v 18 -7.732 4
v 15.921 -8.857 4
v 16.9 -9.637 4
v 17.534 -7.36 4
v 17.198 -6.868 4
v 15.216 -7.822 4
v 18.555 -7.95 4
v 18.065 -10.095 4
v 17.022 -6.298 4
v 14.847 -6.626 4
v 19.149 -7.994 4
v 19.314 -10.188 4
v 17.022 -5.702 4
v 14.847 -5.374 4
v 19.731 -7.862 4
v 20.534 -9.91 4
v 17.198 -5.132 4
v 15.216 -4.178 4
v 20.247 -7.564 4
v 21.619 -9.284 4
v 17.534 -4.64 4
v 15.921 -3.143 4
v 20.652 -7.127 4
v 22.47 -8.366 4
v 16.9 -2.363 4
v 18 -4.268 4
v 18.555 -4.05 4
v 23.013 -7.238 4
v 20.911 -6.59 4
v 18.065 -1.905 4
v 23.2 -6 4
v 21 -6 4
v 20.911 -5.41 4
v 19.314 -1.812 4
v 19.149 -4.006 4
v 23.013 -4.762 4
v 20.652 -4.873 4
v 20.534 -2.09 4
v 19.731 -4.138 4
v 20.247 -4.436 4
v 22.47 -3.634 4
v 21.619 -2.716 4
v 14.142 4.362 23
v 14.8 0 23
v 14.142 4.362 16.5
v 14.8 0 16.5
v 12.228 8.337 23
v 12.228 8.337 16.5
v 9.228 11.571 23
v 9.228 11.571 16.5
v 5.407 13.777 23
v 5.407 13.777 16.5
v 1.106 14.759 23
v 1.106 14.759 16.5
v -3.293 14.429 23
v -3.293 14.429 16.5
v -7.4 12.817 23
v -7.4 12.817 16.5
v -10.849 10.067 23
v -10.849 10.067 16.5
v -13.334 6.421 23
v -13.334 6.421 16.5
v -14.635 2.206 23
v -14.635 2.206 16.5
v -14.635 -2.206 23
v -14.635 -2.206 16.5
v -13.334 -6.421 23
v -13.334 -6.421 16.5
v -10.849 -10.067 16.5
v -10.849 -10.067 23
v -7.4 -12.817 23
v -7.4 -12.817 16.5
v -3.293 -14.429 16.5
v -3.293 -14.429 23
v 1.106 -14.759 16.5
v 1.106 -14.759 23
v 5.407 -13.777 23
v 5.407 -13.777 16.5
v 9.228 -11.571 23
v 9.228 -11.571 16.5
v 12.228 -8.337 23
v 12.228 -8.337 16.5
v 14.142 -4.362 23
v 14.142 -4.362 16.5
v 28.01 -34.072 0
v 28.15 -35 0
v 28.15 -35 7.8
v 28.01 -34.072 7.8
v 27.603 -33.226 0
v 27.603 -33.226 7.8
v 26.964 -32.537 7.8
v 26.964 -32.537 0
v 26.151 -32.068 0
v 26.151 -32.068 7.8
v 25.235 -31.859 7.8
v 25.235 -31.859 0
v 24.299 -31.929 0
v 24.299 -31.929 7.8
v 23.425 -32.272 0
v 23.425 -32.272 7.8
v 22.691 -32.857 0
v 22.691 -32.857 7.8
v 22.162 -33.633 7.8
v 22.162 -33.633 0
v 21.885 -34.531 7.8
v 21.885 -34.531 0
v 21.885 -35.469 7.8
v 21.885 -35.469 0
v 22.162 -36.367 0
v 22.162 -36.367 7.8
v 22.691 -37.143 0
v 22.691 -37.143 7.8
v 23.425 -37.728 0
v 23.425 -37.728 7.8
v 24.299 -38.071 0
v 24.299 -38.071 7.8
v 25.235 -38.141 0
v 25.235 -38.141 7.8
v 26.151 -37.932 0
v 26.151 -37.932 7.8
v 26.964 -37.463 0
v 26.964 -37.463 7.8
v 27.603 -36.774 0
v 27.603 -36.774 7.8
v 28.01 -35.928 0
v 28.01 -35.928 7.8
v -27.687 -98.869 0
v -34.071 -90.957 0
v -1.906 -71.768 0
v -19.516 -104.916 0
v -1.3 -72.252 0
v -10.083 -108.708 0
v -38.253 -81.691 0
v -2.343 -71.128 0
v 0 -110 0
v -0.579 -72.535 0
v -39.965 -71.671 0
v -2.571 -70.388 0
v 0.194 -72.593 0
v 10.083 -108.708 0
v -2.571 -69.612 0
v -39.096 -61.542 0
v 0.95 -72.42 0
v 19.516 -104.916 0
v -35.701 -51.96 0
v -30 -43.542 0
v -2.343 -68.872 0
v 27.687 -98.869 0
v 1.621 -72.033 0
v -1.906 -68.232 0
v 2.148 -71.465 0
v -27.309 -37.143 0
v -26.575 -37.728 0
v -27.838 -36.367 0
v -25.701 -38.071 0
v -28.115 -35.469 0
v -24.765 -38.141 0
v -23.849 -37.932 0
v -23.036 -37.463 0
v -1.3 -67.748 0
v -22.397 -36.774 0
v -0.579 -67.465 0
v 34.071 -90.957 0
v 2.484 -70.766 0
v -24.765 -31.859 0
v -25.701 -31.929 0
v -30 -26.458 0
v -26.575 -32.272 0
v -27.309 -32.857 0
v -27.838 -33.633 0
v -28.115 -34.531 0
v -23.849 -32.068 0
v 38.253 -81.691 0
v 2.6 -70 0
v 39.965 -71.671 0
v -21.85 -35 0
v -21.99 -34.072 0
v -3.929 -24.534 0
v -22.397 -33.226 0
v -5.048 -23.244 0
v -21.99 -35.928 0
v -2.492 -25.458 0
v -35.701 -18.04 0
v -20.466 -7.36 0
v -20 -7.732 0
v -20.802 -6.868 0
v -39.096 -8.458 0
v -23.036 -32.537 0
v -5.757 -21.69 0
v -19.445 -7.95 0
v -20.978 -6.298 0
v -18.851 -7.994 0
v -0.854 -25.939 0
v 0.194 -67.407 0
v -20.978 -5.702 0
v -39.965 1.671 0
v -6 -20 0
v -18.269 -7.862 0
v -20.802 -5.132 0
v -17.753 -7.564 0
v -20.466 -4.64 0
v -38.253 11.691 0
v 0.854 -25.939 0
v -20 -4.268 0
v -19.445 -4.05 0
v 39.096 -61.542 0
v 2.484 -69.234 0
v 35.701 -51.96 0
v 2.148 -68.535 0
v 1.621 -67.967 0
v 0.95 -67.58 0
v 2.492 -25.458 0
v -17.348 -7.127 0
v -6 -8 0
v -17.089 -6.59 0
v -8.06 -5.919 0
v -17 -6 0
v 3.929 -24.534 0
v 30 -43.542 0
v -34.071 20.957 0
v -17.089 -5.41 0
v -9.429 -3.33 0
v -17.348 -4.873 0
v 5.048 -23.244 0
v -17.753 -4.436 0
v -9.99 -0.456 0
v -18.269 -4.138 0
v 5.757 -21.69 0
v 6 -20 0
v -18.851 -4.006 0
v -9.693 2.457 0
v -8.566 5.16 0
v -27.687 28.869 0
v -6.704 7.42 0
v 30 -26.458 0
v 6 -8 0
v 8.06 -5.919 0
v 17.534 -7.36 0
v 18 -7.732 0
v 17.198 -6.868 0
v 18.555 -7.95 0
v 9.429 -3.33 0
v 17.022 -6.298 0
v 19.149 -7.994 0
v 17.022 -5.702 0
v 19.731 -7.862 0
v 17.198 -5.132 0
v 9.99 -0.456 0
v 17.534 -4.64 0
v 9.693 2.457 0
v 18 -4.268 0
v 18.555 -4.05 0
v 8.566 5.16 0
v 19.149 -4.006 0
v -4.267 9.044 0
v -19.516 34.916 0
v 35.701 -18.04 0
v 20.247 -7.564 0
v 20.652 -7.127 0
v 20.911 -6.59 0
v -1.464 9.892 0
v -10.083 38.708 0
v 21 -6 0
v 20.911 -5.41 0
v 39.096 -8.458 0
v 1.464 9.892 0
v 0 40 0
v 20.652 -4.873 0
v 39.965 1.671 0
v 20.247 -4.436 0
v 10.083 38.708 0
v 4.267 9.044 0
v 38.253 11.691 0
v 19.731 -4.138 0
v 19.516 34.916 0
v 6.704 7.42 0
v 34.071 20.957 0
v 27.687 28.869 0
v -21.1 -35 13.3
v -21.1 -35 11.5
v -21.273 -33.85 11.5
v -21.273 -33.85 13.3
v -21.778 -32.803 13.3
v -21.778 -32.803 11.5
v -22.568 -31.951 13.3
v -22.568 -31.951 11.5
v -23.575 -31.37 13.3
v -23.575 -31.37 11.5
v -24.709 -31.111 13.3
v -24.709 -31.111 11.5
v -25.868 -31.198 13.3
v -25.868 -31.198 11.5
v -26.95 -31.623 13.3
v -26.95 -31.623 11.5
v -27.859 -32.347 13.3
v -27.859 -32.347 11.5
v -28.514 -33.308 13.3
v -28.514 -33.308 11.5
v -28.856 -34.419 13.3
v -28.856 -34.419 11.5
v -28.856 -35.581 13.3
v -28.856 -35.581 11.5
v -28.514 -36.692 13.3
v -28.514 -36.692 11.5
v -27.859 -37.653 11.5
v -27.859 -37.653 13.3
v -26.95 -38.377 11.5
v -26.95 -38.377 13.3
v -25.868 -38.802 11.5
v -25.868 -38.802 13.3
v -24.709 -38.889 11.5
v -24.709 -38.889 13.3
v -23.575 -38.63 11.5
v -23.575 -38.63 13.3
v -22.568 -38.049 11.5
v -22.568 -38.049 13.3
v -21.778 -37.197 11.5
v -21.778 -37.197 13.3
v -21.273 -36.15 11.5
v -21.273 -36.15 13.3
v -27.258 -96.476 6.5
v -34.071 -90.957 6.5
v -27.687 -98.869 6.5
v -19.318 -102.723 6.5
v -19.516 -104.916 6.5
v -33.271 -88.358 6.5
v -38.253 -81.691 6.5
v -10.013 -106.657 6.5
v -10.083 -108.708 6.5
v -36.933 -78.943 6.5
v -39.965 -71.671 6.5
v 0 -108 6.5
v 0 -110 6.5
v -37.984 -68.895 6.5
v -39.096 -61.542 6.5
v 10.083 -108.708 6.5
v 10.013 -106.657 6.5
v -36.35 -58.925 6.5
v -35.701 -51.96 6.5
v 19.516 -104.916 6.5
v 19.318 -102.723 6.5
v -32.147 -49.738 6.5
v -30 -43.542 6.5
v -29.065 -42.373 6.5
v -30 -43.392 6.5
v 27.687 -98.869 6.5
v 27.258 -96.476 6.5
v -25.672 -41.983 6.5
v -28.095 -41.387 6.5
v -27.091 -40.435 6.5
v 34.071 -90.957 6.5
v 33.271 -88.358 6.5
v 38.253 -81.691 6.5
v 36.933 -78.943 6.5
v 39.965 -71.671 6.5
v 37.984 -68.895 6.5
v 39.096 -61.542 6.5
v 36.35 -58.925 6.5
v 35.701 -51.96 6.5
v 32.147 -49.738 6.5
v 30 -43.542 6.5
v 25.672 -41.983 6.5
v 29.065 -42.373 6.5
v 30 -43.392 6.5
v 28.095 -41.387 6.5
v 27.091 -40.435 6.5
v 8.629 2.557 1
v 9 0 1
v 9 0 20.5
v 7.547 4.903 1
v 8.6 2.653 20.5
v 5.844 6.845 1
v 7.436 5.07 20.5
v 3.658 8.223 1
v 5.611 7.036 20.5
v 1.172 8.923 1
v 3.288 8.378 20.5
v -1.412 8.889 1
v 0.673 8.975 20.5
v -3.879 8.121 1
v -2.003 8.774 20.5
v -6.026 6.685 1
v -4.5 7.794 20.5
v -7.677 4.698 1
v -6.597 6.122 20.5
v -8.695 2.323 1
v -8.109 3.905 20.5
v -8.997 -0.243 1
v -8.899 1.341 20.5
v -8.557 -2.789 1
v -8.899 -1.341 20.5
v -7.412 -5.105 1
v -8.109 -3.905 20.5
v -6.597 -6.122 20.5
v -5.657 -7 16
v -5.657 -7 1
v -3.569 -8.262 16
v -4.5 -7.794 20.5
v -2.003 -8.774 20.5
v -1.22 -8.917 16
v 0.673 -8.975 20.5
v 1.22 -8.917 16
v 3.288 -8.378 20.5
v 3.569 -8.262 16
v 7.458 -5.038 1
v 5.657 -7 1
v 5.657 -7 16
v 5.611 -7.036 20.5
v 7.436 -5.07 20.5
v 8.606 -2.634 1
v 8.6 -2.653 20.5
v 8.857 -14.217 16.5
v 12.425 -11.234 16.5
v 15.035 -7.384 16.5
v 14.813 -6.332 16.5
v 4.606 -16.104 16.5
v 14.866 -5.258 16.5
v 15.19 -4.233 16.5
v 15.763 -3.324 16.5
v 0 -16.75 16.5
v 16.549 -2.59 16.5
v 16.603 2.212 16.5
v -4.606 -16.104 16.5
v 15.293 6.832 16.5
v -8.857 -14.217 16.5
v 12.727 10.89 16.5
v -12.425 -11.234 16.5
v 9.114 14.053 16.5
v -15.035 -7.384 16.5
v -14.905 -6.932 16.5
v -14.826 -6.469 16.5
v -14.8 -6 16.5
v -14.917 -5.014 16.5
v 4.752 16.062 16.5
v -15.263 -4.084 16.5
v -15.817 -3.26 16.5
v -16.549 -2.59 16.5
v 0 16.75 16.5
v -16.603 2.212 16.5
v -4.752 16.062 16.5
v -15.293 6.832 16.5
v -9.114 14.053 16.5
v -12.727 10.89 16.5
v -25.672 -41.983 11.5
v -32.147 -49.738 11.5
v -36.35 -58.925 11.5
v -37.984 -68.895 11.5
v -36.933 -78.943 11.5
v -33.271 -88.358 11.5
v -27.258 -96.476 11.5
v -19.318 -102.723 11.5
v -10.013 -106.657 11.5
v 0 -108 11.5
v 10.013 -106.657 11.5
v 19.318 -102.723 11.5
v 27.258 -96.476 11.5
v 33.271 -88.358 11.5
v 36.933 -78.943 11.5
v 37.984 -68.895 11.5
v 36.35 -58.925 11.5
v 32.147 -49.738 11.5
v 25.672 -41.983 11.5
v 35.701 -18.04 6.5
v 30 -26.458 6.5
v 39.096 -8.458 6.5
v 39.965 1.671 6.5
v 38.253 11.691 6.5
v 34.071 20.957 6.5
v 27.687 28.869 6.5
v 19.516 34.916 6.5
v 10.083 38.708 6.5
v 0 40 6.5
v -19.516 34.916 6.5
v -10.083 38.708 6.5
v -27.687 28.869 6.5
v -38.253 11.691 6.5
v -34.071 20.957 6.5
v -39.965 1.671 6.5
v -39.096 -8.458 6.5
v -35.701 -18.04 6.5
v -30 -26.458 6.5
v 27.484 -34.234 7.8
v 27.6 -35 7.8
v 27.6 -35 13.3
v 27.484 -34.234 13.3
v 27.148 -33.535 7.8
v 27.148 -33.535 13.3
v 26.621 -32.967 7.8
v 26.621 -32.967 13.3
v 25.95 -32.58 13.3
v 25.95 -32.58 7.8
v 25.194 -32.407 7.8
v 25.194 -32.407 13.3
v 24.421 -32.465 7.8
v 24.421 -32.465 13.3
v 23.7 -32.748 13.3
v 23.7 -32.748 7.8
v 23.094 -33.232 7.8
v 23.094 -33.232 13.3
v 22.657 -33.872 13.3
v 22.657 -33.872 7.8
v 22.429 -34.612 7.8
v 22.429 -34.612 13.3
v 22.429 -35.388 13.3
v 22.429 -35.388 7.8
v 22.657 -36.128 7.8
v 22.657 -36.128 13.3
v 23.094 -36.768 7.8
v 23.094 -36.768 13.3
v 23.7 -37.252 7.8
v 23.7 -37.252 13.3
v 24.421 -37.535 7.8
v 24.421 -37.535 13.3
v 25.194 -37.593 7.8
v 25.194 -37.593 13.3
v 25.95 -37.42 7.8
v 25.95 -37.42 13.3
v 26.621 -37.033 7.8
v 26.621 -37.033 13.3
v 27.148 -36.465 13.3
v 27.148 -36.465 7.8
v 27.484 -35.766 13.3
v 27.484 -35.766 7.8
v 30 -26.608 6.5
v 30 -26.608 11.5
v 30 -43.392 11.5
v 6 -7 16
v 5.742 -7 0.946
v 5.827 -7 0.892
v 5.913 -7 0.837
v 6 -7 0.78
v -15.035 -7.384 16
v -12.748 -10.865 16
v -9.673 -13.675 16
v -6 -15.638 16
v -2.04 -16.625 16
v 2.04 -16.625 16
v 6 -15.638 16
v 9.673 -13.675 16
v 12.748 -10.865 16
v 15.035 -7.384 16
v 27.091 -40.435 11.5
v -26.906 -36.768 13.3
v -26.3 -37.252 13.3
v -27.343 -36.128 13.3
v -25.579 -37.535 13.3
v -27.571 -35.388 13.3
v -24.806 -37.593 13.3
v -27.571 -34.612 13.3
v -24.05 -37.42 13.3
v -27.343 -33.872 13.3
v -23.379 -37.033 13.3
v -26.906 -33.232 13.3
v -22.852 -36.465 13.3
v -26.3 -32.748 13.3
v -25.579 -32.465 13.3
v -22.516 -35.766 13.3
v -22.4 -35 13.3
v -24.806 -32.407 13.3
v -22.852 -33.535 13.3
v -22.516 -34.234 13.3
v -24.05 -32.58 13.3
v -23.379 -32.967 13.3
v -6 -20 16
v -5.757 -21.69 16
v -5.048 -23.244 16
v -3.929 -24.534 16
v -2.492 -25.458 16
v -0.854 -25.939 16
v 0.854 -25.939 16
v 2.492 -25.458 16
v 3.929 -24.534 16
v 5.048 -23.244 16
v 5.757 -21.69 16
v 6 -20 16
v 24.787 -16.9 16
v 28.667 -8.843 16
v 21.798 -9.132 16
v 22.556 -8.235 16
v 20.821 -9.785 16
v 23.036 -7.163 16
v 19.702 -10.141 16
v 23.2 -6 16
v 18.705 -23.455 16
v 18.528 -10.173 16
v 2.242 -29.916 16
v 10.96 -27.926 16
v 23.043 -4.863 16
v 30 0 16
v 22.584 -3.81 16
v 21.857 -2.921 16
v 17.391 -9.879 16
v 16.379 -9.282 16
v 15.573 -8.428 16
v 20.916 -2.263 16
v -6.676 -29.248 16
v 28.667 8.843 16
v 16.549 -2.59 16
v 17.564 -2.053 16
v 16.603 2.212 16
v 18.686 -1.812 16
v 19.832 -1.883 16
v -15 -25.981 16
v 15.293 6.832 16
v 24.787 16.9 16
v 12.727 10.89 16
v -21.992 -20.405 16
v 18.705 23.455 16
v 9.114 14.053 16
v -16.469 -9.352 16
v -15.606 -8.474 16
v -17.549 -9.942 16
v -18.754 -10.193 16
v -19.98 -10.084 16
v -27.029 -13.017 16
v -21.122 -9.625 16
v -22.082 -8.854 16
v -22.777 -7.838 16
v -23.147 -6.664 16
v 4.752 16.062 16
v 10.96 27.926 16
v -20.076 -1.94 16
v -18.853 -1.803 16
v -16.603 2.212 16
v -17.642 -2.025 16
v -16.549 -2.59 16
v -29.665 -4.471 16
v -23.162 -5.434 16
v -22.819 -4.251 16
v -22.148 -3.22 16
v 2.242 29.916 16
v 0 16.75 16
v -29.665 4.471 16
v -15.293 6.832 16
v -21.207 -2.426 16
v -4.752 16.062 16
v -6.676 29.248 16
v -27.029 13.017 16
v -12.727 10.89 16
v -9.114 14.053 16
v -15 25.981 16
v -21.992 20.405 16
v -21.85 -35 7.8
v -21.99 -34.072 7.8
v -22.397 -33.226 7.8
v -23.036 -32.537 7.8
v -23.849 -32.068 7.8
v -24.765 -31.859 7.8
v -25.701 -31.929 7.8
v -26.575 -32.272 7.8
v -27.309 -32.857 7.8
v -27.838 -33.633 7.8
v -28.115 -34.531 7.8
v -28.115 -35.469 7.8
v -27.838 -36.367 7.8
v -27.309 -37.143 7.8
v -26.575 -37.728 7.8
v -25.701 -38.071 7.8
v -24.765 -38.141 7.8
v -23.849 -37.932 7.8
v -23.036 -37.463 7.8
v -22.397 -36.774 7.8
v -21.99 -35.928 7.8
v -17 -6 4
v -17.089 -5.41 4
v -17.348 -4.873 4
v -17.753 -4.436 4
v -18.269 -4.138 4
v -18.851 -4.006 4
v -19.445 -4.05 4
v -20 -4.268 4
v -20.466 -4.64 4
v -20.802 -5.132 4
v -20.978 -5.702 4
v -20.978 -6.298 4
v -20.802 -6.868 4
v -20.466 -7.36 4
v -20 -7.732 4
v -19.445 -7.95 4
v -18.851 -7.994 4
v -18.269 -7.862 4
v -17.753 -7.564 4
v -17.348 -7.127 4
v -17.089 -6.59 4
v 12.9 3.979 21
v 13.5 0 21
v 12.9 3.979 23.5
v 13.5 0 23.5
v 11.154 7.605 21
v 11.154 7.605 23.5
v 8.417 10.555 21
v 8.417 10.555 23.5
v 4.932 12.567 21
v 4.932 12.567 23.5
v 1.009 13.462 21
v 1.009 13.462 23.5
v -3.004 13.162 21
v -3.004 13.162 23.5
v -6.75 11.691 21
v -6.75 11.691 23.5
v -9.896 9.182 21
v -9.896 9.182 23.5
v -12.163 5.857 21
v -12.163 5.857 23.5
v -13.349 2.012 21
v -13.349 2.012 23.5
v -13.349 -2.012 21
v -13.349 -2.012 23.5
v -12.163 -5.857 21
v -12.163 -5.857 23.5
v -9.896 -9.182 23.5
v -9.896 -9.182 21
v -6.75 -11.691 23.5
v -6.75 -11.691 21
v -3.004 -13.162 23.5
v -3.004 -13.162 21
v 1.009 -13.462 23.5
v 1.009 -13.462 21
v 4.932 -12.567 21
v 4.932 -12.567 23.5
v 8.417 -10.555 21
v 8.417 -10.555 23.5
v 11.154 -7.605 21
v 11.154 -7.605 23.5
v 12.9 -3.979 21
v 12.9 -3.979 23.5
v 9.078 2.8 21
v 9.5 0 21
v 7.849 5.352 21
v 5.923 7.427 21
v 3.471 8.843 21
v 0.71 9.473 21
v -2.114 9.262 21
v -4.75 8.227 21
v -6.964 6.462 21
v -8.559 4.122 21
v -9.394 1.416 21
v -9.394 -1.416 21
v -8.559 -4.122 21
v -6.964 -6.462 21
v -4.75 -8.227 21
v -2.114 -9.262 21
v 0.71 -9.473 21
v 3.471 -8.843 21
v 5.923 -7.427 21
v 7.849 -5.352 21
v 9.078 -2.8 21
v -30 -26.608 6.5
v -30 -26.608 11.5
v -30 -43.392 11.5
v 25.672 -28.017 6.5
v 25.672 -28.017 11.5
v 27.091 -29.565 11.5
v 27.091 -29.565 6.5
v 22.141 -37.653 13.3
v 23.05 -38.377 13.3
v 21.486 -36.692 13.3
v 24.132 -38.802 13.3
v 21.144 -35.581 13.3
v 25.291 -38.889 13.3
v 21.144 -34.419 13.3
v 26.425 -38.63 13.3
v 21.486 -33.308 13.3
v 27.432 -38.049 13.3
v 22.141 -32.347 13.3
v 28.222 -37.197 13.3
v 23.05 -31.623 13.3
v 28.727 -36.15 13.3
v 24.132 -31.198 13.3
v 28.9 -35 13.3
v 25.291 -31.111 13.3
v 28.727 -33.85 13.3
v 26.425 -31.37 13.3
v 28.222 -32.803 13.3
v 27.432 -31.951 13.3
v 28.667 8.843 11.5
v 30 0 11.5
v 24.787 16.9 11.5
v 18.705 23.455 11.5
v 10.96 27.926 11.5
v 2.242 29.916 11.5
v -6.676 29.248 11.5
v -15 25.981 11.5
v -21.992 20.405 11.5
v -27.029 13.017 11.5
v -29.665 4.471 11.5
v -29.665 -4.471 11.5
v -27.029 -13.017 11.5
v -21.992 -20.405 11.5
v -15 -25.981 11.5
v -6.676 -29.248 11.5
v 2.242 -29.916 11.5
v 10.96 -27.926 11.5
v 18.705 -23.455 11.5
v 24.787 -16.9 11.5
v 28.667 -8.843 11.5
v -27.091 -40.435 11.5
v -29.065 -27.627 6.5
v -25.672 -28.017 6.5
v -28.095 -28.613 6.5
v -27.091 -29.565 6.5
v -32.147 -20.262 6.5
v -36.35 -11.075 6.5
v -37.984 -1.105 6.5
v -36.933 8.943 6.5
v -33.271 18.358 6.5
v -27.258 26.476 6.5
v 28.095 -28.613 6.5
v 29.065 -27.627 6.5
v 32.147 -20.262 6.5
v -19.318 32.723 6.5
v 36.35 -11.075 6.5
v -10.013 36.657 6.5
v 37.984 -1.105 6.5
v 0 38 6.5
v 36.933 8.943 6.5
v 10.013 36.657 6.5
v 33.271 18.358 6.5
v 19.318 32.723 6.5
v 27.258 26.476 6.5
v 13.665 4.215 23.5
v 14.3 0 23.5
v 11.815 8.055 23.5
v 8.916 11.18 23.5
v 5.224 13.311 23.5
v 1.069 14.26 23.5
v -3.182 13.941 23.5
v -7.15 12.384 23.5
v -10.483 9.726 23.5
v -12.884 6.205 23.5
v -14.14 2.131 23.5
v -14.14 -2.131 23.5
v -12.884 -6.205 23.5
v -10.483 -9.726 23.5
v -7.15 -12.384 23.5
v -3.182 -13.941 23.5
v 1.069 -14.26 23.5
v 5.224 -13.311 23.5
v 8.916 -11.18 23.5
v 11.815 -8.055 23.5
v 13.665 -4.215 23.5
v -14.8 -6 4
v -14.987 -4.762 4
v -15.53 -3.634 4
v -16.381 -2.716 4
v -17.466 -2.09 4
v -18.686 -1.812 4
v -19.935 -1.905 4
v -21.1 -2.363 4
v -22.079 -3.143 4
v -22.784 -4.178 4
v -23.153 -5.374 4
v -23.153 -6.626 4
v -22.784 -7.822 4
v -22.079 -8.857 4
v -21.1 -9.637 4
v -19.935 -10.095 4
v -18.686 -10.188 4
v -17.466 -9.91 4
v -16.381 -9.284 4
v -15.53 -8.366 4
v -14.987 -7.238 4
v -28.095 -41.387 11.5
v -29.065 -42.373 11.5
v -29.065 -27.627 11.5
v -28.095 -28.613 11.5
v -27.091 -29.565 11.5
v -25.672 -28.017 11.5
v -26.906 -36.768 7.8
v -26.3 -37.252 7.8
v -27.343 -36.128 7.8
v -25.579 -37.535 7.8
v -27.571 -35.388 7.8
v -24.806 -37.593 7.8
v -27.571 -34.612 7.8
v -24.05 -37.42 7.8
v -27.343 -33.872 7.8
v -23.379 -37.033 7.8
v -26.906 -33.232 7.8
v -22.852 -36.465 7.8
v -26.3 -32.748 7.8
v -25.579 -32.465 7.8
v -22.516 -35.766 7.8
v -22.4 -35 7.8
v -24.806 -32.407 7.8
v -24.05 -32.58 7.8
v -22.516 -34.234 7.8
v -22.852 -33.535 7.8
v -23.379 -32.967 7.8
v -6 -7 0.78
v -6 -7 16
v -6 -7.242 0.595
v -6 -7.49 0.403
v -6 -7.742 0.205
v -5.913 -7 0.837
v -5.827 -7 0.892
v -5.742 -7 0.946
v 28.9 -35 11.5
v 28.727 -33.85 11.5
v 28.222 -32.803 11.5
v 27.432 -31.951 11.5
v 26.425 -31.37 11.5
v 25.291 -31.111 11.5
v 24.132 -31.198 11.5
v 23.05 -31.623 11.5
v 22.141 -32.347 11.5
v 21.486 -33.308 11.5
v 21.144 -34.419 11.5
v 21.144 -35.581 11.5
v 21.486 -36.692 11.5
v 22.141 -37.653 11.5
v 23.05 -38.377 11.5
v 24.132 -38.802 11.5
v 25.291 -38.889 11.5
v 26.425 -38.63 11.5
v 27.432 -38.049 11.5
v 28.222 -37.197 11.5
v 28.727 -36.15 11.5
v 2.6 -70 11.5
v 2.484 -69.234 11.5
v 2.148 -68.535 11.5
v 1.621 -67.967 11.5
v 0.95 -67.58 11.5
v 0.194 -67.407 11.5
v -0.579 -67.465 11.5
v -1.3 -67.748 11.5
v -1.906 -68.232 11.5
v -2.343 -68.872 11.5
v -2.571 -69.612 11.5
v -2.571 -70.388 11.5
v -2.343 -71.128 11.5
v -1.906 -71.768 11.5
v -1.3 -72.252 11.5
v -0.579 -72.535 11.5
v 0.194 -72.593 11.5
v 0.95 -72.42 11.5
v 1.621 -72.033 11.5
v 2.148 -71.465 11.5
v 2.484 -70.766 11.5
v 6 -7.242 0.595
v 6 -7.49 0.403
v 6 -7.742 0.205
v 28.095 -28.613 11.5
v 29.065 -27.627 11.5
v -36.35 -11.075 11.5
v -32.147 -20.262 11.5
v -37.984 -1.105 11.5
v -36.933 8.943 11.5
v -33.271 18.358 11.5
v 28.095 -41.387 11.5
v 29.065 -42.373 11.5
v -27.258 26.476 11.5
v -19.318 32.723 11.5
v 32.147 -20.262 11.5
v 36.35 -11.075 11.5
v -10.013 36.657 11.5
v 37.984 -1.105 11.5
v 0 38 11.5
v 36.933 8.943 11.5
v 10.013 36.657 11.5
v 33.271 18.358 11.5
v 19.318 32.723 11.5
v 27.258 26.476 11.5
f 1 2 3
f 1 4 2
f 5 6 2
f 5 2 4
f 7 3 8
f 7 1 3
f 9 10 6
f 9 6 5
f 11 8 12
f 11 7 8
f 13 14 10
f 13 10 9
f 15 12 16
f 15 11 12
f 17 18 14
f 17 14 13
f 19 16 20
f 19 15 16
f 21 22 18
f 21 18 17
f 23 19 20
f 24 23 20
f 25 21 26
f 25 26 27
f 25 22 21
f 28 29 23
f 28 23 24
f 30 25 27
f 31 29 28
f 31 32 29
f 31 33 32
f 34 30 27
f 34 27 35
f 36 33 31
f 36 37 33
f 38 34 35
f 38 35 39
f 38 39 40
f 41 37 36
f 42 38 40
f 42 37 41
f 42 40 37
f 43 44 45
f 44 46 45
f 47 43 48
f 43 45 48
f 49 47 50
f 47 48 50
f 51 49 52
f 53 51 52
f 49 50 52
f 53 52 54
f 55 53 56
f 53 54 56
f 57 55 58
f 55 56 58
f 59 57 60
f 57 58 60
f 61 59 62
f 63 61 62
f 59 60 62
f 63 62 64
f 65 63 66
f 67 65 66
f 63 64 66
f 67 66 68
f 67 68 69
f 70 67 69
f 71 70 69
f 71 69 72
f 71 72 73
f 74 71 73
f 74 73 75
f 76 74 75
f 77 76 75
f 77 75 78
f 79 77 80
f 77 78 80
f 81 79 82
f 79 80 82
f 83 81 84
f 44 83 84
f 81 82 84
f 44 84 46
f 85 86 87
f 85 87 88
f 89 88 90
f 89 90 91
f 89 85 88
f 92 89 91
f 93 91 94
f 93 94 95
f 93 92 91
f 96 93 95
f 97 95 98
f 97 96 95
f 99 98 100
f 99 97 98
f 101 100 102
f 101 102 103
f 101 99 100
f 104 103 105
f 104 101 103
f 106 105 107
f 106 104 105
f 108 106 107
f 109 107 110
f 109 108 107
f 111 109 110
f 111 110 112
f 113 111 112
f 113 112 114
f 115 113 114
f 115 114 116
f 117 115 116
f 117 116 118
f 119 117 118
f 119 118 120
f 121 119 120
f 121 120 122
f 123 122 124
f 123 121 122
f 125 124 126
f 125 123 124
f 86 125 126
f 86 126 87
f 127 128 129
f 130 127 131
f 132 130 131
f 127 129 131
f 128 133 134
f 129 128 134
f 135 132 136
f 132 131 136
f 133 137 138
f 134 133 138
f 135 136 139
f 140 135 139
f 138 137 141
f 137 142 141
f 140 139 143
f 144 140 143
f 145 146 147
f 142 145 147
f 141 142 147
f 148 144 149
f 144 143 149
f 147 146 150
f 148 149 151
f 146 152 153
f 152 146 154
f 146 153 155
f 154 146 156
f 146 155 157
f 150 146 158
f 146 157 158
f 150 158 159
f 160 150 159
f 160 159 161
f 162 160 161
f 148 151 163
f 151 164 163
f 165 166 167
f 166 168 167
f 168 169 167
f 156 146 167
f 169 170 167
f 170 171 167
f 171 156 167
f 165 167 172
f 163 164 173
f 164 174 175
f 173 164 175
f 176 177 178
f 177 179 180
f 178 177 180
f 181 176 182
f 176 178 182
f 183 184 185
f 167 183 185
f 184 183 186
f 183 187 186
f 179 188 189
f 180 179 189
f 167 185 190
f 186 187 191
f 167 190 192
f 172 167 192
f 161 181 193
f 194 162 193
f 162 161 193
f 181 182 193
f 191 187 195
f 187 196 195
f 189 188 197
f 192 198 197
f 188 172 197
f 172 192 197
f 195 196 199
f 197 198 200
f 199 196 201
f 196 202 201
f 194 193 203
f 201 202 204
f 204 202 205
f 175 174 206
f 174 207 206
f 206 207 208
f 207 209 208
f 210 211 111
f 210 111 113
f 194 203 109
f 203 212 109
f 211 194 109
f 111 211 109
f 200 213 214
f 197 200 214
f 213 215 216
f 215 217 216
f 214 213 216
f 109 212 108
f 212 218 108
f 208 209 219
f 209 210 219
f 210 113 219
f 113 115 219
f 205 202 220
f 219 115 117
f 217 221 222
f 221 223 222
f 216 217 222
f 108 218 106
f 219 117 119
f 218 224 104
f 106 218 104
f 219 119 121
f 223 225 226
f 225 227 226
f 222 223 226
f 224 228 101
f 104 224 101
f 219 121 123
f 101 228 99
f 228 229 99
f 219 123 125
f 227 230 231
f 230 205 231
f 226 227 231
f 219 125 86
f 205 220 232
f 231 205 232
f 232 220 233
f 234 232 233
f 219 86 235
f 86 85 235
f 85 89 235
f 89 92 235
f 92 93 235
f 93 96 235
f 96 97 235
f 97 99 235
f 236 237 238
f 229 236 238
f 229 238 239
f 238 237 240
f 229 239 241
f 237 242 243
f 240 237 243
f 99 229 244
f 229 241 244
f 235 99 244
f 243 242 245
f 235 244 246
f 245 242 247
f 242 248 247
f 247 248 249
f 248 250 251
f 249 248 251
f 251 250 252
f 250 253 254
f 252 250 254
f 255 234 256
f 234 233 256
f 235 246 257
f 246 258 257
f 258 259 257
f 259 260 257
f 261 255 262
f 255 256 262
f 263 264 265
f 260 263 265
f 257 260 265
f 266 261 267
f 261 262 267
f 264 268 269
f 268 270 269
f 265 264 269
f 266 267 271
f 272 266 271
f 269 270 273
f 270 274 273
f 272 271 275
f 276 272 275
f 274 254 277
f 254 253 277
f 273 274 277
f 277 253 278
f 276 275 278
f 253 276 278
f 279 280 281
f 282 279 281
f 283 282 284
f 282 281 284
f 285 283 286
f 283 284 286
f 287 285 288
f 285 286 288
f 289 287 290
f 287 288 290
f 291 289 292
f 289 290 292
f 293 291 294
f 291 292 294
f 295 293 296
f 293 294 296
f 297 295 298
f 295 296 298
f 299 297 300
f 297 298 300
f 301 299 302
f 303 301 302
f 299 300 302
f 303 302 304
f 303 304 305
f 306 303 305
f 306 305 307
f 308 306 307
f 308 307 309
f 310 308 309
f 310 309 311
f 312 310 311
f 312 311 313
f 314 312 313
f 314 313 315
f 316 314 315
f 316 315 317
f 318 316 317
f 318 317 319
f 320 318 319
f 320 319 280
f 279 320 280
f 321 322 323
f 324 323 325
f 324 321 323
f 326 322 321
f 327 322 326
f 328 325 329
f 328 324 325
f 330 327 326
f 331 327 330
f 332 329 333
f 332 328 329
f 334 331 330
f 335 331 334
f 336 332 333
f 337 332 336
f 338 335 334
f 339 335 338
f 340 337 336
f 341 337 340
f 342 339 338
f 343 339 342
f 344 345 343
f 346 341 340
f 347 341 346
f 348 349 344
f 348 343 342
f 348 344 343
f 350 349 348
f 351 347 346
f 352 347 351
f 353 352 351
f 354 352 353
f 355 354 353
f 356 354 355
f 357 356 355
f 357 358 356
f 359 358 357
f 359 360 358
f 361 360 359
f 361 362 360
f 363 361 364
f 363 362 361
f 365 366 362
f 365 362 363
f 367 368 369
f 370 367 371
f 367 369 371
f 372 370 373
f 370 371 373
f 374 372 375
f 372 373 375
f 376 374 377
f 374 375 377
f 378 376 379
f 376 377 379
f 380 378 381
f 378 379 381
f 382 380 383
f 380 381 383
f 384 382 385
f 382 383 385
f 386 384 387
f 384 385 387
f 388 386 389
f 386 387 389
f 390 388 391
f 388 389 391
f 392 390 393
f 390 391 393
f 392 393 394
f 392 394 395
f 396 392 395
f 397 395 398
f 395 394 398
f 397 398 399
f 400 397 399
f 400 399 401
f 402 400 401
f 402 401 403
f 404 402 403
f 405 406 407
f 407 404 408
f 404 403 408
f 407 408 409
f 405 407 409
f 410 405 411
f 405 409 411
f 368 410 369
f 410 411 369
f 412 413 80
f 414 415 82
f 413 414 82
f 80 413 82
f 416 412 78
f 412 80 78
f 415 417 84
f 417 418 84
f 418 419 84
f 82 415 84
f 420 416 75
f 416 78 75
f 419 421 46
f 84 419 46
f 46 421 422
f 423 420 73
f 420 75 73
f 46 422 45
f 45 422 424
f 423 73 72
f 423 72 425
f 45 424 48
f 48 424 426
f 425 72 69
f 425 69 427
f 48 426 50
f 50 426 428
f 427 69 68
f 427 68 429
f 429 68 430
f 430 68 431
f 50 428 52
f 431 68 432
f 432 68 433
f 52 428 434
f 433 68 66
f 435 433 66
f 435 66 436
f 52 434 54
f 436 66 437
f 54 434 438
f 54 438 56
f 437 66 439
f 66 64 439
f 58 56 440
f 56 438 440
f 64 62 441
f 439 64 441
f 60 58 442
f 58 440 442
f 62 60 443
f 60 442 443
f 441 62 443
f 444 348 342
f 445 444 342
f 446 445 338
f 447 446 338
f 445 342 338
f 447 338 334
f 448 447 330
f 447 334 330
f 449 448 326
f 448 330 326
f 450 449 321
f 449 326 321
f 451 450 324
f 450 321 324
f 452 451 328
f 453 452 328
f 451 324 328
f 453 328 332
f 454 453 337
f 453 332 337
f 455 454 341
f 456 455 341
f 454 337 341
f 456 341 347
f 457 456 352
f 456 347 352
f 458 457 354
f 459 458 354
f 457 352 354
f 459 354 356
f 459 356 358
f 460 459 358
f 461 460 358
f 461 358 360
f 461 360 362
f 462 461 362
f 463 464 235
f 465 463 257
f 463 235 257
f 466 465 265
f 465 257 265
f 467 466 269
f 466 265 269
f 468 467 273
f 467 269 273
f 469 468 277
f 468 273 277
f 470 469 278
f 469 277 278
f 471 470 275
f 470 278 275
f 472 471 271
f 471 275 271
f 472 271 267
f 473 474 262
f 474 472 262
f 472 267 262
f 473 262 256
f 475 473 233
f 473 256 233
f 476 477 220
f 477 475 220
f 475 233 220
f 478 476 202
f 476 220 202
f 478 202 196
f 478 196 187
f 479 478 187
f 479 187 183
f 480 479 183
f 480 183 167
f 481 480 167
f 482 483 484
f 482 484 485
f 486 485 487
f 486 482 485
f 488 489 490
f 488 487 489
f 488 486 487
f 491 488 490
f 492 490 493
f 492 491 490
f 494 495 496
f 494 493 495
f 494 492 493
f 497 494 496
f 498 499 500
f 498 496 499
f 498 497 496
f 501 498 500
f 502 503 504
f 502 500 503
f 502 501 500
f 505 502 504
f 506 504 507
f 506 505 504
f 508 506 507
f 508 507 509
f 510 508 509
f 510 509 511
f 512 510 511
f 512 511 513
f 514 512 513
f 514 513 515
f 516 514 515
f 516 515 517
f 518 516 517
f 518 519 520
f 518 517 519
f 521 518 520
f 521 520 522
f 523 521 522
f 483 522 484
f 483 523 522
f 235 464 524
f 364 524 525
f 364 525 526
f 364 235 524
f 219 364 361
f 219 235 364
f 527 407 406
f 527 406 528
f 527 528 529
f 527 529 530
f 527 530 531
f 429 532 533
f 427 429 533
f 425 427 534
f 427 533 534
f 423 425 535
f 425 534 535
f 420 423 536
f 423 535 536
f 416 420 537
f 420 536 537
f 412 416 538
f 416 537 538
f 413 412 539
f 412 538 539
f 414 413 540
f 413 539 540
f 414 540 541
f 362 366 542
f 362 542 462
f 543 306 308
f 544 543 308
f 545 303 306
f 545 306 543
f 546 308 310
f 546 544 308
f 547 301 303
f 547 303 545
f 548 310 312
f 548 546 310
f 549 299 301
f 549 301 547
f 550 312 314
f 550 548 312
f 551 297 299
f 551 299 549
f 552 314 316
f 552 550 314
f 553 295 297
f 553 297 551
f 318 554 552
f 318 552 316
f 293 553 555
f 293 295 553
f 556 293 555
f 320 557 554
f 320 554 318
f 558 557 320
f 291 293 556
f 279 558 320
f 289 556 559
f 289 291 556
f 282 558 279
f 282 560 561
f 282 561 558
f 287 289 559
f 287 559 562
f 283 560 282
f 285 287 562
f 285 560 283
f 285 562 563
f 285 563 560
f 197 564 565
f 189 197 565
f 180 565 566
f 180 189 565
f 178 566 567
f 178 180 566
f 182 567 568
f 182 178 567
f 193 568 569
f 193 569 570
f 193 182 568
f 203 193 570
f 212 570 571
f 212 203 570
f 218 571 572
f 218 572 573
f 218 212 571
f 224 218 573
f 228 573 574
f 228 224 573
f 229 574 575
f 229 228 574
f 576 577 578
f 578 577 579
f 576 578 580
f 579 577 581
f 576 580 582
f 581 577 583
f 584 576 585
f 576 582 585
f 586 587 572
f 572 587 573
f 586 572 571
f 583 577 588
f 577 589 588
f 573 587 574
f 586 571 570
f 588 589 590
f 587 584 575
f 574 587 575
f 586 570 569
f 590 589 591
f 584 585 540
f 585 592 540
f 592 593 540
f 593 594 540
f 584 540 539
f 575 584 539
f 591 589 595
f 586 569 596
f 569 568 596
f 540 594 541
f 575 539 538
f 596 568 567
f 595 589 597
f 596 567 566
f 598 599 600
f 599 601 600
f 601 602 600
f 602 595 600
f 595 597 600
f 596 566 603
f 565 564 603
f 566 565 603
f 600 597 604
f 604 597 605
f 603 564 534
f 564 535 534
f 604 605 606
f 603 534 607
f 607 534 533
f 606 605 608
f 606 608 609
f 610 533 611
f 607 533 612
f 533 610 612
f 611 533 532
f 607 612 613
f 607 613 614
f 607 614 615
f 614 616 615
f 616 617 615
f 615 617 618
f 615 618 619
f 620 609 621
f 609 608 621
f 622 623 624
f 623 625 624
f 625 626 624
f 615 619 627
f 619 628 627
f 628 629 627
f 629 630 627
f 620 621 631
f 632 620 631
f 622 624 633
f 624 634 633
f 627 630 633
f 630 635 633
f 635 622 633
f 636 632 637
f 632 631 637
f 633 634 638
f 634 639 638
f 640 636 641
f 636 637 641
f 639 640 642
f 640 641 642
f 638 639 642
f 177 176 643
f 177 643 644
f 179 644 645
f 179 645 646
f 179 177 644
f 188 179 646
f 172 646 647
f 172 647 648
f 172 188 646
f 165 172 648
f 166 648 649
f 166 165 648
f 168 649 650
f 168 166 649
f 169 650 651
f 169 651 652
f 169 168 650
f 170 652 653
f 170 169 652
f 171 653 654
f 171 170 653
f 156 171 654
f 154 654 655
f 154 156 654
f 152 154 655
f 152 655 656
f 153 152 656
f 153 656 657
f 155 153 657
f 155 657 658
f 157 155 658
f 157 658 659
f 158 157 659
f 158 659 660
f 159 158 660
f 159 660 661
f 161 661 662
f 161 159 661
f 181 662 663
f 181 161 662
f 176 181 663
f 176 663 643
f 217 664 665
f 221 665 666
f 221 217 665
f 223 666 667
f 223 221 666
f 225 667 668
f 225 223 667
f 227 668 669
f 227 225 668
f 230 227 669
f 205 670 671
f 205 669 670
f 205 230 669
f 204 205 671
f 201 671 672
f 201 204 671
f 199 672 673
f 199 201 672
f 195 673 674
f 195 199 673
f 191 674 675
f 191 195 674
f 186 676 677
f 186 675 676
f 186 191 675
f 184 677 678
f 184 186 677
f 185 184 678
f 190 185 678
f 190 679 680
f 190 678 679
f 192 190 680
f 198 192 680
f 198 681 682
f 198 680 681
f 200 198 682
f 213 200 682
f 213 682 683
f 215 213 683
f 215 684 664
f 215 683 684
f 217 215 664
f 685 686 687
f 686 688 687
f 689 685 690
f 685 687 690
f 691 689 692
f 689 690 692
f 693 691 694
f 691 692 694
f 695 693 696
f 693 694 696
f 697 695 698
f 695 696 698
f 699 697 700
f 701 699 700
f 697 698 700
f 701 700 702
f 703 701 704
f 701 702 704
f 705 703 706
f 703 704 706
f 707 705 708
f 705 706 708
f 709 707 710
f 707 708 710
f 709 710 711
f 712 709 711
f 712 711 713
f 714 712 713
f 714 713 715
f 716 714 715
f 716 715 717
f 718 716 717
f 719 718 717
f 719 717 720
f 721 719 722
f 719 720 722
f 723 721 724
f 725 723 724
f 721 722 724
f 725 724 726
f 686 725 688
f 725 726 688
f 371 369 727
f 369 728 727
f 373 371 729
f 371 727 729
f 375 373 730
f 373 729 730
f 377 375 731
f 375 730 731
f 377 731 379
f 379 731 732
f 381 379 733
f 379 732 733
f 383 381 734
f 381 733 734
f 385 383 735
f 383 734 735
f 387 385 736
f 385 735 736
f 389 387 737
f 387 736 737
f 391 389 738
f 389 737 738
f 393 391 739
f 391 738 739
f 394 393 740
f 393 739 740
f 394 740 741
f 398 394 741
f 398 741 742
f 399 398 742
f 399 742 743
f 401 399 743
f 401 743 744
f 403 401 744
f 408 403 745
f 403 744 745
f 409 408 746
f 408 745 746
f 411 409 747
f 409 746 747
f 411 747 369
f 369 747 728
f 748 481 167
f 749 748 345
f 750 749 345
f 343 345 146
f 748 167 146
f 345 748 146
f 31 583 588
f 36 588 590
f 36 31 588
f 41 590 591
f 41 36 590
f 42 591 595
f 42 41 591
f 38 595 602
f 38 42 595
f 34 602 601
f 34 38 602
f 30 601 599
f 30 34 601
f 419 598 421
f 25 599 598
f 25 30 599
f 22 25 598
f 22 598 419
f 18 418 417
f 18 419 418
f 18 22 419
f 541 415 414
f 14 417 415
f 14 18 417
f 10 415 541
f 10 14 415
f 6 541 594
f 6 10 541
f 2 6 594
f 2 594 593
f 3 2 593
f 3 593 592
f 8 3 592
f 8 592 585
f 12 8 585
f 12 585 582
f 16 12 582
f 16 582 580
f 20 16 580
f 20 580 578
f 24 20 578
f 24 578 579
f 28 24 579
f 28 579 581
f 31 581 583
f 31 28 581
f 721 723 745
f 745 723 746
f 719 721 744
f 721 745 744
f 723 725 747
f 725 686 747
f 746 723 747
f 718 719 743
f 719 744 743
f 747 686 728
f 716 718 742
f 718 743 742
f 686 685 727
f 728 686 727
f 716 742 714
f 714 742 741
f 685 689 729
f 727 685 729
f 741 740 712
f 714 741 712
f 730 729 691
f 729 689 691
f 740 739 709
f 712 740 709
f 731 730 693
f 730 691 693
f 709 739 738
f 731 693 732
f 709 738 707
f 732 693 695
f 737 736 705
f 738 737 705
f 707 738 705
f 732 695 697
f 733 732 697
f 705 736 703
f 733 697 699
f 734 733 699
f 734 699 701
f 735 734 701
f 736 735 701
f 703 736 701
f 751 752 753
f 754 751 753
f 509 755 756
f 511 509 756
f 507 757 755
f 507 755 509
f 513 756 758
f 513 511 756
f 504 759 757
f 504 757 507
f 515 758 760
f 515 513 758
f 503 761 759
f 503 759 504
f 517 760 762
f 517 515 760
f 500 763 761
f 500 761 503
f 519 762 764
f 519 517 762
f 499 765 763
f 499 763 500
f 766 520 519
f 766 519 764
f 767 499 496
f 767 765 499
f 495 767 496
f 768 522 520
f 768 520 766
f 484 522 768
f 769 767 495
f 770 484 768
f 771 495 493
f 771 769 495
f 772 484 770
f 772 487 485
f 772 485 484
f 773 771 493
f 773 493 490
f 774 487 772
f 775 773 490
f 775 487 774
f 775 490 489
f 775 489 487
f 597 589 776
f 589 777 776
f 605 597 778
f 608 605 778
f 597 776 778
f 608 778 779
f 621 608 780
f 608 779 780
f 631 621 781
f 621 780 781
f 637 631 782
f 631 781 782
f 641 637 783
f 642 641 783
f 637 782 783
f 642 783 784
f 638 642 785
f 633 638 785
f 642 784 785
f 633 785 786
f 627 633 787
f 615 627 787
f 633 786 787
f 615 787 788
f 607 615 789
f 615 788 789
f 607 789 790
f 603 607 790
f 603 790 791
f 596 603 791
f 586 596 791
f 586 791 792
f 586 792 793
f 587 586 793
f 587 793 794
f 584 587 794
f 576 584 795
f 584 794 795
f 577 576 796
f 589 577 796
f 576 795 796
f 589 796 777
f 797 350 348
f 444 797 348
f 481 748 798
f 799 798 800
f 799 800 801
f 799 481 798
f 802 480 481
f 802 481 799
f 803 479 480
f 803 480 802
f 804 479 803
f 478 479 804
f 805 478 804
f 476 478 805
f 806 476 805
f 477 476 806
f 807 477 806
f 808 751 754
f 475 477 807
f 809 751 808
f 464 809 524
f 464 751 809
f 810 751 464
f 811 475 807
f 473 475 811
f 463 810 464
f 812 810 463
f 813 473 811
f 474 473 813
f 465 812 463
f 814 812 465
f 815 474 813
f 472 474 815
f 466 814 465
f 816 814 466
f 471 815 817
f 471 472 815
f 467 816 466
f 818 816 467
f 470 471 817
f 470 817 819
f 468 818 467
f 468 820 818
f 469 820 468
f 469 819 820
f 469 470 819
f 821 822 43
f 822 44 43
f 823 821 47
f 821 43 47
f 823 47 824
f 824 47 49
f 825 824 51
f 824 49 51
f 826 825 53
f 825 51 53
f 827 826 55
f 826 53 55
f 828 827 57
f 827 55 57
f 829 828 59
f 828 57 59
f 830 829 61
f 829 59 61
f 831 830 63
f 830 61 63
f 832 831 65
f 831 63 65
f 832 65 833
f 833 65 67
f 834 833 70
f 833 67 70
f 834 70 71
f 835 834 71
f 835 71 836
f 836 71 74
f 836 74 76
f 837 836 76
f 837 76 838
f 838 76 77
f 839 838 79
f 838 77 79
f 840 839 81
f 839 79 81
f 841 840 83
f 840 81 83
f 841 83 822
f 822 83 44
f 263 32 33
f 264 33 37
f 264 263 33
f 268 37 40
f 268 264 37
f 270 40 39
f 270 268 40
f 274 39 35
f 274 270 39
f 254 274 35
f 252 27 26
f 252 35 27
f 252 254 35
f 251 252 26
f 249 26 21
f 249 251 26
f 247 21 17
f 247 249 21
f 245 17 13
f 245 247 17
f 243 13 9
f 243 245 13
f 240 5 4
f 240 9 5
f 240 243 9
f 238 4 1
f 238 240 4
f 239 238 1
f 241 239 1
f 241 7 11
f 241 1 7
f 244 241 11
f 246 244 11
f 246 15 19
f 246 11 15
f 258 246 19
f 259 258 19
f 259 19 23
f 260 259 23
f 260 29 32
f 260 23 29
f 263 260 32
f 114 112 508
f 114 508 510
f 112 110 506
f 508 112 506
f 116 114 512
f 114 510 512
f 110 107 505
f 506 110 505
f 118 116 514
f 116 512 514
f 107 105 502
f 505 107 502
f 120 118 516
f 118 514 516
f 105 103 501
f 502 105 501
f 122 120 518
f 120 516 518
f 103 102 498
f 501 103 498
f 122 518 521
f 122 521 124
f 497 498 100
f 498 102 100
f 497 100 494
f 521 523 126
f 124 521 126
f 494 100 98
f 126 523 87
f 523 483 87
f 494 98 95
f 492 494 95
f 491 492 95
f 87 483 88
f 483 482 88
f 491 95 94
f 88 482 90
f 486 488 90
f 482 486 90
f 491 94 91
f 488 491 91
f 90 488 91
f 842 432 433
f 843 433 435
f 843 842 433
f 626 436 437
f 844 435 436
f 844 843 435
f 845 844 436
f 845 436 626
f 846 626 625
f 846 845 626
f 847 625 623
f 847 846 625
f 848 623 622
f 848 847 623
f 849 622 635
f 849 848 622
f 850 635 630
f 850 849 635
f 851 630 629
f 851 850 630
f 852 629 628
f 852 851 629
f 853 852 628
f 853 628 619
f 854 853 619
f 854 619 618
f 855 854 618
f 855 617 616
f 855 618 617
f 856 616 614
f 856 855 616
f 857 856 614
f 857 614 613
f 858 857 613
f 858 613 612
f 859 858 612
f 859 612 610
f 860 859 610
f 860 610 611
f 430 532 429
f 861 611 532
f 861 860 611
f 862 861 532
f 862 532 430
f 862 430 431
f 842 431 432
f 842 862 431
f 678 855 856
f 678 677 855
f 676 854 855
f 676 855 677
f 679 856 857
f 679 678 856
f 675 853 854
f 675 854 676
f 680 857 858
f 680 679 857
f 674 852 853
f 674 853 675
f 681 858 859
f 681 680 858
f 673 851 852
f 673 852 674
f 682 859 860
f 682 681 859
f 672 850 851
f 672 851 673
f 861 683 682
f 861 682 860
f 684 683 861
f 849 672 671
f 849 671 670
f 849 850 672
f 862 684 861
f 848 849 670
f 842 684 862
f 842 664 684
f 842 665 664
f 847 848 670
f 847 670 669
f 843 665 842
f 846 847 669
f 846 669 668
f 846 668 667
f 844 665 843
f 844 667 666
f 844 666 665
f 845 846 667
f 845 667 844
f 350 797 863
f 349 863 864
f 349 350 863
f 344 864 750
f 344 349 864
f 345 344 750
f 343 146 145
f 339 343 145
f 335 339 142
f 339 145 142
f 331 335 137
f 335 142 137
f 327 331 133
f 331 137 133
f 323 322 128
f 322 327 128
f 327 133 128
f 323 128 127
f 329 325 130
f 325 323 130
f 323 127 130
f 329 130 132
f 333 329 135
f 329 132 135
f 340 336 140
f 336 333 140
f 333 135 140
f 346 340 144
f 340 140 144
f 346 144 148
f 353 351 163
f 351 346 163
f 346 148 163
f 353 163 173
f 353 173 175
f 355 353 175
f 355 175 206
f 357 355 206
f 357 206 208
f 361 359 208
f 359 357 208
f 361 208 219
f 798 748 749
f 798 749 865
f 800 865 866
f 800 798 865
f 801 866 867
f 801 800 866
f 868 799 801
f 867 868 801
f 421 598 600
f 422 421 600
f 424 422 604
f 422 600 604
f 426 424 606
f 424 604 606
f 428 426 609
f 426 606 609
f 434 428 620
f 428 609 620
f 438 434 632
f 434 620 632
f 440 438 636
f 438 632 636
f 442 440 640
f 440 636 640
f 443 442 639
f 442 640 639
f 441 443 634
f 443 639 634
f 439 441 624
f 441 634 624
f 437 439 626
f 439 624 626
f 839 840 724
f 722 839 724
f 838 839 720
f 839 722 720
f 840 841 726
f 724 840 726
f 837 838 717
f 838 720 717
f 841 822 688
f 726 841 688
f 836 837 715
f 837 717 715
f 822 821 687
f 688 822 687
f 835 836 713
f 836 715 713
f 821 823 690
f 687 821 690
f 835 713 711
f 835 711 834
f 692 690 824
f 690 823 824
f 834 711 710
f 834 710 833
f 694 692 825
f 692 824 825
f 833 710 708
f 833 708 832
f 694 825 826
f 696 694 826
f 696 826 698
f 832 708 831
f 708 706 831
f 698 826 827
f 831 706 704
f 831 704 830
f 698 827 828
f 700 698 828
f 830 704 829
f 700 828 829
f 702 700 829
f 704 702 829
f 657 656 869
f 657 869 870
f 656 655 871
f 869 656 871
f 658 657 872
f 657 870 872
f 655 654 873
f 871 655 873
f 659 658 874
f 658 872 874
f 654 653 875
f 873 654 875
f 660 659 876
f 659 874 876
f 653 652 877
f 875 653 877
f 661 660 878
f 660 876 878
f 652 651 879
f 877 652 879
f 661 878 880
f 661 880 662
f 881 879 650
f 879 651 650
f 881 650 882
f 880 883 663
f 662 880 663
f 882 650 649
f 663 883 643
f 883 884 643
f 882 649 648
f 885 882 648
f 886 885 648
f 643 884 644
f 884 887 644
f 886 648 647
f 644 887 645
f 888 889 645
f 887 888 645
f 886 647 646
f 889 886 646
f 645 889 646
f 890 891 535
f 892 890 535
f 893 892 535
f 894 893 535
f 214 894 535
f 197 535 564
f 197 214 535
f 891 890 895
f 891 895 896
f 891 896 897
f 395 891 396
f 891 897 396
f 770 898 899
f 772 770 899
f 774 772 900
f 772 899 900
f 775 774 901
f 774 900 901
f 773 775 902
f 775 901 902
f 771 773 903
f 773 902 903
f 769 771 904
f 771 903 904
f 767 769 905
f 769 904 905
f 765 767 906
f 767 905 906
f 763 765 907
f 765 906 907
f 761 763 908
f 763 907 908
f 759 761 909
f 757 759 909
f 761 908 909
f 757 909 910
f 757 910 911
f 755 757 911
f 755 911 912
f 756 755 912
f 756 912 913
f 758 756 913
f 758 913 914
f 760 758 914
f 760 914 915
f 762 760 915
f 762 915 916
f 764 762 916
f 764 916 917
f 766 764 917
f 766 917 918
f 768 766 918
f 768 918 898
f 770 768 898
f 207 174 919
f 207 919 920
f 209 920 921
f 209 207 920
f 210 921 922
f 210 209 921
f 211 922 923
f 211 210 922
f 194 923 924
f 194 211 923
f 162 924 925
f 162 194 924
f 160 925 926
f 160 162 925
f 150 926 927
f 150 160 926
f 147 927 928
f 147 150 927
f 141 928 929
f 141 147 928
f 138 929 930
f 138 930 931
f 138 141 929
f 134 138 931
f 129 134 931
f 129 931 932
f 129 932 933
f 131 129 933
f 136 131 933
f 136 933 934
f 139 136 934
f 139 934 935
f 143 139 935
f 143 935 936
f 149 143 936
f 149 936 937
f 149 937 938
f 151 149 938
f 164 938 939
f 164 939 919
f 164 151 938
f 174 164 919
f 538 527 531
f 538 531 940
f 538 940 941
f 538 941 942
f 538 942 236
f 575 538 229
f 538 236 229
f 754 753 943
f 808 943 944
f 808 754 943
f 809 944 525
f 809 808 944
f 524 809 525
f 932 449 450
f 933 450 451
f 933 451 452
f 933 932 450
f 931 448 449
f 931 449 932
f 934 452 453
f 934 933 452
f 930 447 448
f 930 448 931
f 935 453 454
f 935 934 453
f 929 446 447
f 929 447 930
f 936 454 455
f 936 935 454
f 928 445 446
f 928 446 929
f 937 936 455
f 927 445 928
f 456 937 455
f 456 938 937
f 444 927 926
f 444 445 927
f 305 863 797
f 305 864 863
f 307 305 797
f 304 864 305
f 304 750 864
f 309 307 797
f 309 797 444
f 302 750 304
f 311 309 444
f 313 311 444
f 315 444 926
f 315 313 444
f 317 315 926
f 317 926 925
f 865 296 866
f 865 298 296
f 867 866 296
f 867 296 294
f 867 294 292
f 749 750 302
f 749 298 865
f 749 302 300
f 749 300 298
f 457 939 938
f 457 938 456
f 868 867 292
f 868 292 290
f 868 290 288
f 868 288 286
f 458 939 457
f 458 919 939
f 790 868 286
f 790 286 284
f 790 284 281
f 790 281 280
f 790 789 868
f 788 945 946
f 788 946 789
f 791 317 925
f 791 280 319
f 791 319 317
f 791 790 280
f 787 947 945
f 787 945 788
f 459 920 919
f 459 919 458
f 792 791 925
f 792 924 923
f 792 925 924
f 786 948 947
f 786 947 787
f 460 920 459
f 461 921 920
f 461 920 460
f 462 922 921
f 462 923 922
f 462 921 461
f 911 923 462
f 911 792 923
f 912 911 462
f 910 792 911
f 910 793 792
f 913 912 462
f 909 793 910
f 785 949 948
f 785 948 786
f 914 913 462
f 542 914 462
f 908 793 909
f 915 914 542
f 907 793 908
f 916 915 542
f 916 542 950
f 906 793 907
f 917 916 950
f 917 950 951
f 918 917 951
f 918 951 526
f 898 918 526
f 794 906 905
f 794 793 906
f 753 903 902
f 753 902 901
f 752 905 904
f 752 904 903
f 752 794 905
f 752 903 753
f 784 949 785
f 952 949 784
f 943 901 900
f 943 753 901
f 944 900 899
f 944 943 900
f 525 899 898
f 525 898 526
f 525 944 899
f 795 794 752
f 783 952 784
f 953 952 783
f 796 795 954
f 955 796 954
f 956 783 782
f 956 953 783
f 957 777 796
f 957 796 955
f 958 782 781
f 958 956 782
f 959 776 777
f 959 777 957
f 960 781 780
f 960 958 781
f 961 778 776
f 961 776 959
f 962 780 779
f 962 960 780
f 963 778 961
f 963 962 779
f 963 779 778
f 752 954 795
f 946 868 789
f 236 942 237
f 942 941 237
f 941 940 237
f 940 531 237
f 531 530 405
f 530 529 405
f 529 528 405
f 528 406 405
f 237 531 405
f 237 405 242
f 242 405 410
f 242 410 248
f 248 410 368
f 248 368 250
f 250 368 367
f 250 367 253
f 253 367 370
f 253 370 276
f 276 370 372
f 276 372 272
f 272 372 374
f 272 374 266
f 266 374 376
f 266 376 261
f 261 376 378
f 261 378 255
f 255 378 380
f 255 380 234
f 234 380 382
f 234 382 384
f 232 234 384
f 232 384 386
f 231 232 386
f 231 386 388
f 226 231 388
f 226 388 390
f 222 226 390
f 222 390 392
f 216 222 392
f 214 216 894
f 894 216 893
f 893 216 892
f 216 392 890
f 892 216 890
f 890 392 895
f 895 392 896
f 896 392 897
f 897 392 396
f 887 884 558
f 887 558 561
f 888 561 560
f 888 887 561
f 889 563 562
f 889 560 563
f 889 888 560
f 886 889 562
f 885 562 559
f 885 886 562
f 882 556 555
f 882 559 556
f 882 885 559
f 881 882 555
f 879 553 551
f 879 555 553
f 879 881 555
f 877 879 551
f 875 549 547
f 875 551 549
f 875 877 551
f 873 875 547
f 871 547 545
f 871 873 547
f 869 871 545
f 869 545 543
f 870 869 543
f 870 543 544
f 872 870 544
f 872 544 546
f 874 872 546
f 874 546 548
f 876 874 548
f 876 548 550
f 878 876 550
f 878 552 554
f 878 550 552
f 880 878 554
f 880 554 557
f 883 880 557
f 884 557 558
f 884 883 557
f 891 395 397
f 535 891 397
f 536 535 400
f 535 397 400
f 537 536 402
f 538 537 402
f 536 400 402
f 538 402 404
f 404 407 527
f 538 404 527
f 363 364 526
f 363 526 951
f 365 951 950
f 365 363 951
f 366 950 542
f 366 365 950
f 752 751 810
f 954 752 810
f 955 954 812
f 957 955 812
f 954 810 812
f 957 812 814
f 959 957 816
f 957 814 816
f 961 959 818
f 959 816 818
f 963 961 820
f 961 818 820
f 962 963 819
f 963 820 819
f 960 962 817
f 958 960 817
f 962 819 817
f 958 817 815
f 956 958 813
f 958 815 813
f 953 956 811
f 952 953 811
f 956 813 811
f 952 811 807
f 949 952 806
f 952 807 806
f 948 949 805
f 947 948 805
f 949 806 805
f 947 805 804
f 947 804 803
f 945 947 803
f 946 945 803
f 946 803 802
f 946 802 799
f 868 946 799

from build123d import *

# Parameters (mm, degrees)
SKETCH030_R     = 3.9
PAD005_DEPTH    = 1.8
SKETCH029_R     = 2.6
PAD006_DEPTH    = 11.5
SKETCH033_R     = 2.6
POCKET_DEPTH    = 14
POCKET011_DEPTH = 5
SKETCH034_R     = 3.15
POCKET012_DEPTH = 7.8
POCKET013_DEPTH = 16
SKETCH036_R     = 2
POCKET014_DEPTH = 16
SKETCH037_R     = 4.2
POCKET015_DEPTH = 13


with BuildPart() as part:
    # Sketch → Revolution (revolve)
    with BuildSketch(Plane.XZ):
        Polygon((13.5, 21), (13.5, 23.5), (14.3, 23.5), (14.8, 23), (14.8, 16.5), (16.75, 16.5), (16.75, 16), (30, 16), (30, 11.5), (40, 11.5), (40, 0), (10, 0), (9, 1), (9, 20.5), (9.5, 21), align=None)
    revolve(axis=Axis((0, 0, 0), (0, 0, 1)))

    # Sketch030 → Pad005 (new body)
    with BuildSketch(Plane.XY.offset(11.5)):
        with Locations((-25, -35)):
            Circle(SKETCH030_R)
        with Locations((25, -35)):
            Circle(SKETCH030_R)
    extrude(amount=PAD005_DEPTH)

    # Sketch029 → Pad006 (join)
    with BuildSketch(Plane.XY):
        with BuildLine():
            Line((-30, -26.457513), (-30, -43.542487))
            ThreePointArc((-30, -43.542487), (0, -110), (30, -43.542487))
            Line((30, -26.457513), (30, -43.542487))
            ThreePointArc((-30, -26.457513), (0, -40), (30, -26.457513))
        make_face()
        with Locations((0, -70)):
            Circle(SKETCH029_R, mode=Mode.SUBTRACT)
    extrude(amount=PAD006_DEPTH)

    # Sketch033 → Pocket (cut)
    with BuildSketch(Plane.XY):
        with Locations((-25, -35)):
            Circle(SKETCH033_R)
        with Locations((25, -35)):
            Circle(SKETCH033_R)
    extrude(amount=POCKET_DEPTH, mode=Mode.SUBTRACT)

    # Sketch031 → Pocket011 (cut)
    with BuildSketch(Plane.XY.offset(6.5)):
        with BuildLine():
            ThreePointArc((27.091167, -29.564821), (0, 40.1), (-27.091167, -29.564821))
            Line((-25.672428, -28.016539), (-27.091167, -29.564821))
            ThreePointArc((25.672428, -28.016539), (0, 38), (-25.672428, -28.016539))
            Line((25.672428, -28.016539), (27.091167, -29.564821))
        make_face()
        with BuildLine():
            ThreePointArc((-27.091167, -40.435179), (0, -110.1), (27.091167, -40.435179))
            Line((27.091167, -40.435179), (25.672428, -41.983461))
            ThreePointArc((-25.672428, -41.983461), (0, -108), (25.672428, -41.983461))
            Line((-27.091167, -40.435179), (-25.672428, -41.983461))
        make_face()
    extrude(amount=POCKET011_DEPTH, mode=Mode.SUBTRACT)

    # Sketch034 → Pocket012 (cut)
    with BuildSketch(Plane.XY):
        with Locations((-25, -35)):
            Circle(SKETCH034_R)
        with Locations((25, -35)):
            Circle(SKETCH034_R)
    extrude(amount=POCKET012_DEPTH, mode=Mode.SUBTRACT)

    # Sketch035 → Pocket013 (cut)
    with BuildSketch(Plane.XY):
        with BuildLine():
            Line((-6, -7), (-6, -20))
            ThreePointArc((-6, -20), (0, -26), (6, -20))
            Line((6, -7), (6, -20))
            Line((-6, -7), (6, -7))
        make_face()
    extrude(amount=POCKET013_DEPTH, mode=Mode.SUBTRACT)

    # Sketch036 → Pocket014 (cut)
    with BuildSketch(Plane.XY):
        with Locations((-19, -6)):
            Circle(SKETCH036_R)
        with Locations((19, -6)):
            Circle(SKETCH036_R)
    extrude(amount=POCKET014_DEPTH, mode=Mode.SUBTRACT)

    # Sketch037 → Pocket015 (cut)
    with BuildSketch(Plane.XY.offset(4)):
        with Locations((-19, -6)):
            Circle(SKETCH037_R)
        with Locations((19, -6)):
            Circle(SKETCH037_R)
    extrude(amount=POCKET015_DEPTH, mode=Mode.SUBTRACT)


solid = part.part
